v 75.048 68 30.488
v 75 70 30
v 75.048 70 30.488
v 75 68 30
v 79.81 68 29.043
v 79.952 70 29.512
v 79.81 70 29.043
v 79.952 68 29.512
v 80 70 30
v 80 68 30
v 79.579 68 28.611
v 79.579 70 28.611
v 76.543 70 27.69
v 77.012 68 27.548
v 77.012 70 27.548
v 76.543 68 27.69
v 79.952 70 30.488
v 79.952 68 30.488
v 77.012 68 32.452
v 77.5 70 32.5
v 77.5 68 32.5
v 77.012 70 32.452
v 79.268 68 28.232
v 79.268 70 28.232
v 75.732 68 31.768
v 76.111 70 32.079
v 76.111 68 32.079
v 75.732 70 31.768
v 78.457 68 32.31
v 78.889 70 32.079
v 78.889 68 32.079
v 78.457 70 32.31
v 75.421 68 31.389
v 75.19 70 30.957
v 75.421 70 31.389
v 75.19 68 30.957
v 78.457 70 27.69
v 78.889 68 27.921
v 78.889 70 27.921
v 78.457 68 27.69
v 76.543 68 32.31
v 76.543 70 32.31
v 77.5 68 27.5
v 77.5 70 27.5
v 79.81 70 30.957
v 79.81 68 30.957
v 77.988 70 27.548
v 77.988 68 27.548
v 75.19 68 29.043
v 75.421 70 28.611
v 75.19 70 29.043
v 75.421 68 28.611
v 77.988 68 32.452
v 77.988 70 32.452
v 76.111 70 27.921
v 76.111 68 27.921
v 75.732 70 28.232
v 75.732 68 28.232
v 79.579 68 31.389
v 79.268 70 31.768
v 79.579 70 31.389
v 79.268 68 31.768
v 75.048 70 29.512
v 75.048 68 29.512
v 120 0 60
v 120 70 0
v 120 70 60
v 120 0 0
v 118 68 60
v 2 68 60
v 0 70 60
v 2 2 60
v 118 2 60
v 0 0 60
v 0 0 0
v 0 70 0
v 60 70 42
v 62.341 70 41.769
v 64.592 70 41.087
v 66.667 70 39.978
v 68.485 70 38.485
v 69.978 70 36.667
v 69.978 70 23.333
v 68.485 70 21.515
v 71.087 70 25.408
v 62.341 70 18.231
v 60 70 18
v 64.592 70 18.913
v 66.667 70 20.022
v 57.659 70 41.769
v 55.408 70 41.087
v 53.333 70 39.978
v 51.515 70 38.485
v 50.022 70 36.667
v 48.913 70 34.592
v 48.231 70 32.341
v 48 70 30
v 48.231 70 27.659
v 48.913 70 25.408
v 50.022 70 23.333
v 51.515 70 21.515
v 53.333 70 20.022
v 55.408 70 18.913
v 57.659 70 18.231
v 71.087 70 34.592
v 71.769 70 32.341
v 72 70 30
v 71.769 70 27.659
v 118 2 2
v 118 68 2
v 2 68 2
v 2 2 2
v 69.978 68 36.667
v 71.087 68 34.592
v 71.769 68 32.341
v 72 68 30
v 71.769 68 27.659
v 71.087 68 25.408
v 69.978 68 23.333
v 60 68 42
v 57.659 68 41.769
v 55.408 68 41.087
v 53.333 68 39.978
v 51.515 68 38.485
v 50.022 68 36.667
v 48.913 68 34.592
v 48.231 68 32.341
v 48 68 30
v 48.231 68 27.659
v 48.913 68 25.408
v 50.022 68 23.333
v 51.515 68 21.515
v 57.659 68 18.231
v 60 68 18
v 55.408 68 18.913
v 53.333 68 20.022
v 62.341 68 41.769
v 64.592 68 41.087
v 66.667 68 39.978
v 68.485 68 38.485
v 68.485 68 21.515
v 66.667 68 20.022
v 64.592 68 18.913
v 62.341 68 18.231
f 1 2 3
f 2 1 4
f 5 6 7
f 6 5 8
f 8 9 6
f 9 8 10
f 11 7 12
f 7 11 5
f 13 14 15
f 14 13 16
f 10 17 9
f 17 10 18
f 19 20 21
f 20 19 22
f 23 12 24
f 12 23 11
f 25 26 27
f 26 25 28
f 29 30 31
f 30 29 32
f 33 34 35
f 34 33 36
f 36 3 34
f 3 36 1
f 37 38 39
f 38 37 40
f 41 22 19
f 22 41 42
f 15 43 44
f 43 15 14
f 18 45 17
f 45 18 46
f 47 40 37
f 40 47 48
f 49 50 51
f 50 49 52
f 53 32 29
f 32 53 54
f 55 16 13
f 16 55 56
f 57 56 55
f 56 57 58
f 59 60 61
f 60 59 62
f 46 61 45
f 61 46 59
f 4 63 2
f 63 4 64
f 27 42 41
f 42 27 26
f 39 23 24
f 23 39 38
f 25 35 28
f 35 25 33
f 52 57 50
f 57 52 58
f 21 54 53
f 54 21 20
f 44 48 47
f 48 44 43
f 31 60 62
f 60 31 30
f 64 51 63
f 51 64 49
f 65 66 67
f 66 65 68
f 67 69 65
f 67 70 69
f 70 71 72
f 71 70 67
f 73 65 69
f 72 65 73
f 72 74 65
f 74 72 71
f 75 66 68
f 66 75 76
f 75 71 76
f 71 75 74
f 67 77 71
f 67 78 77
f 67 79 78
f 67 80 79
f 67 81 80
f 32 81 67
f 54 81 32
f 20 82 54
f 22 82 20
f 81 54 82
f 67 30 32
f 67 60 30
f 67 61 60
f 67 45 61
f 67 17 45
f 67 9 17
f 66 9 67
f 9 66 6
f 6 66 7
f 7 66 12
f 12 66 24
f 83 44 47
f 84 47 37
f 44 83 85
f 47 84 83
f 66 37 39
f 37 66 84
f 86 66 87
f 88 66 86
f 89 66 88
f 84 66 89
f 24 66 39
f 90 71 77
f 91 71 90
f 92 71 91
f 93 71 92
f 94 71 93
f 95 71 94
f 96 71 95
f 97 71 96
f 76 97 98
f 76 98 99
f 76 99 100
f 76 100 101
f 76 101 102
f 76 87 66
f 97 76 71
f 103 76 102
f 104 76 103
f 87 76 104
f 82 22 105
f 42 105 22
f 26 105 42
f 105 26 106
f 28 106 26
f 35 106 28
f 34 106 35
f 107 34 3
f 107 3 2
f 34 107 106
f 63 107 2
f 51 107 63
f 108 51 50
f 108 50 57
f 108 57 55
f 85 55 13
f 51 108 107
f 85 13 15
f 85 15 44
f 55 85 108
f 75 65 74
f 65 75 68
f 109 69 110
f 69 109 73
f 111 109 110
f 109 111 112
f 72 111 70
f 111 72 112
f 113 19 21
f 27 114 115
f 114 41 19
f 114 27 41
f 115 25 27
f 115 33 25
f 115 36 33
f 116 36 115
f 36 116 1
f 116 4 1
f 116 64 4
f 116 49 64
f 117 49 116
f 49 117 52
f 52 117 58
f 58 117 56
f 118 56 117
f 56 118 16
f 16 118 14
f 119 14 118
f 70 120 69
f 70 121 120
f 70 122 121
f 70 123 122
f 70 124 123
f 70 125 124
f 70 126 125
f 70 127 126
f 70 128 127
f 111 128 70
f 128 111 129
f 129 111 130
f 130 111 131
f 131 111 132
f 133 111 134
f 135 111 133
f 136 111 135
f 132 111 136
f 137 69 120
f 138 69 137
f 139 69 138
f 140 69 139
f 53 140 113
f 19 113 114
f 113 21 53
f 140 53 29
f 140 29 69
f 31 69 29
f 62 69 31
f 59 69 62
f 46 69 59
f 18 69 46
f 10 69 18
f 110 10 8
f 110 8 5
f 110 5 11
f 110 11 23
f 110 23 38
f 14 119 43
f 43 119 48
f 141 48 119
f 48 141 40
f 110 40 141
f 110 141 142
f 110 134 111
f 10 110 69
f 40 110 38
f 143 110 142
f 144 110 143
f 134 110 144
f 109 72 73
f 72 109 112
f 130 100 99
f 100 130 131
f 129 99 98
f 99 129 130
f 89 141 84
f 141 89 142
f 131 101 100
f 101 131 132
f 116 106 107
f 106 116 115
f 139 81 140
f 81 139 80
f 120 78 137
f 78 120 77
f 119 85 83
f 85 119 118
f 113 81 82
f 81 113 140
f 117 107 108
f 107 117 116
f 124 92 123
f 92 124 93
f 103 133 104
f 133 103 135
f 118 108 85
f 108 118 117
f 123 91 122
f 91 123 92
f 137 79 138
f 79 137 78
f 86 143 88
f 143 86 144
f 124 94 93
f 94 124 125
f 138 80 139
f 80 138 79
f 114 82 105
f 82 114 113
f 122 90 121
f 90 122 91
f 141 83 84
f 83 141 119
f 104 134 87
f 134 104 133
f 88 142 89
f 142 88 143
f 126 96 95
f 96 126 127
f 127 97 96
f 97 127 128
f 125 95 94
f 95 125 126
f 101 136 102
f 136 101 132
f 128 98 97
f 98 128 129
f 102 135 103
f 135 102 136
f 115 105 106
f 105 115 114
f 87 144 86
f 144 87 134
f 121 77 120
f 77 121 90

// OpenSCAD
$fn = 32;

// ----------------------------------------------------------------------
// Vent box: roundvent enclosure
// ----------------------------------------------------------------------

// --- parameters (mm) ---
box_l = 120;              // box length, X
box_w = 70;               // box width, Y
box_h = 60;               // box height, Z
wall_t = 2;               // shell wall thickness
vent_d = 24;              // central vent diameter
ring_d = 5;               // ring hole diameter
n_ring = 6;               // holes in the ring
ring_r = 17.5;            // ring radius

ring_step = 360 / n_ring;  // ring hole angular step

difference() {
  cube([box_l, box_w, box_h]);
  translate([wall_t, wall_t, wall_t])
    cube([box_l - 2 * wall_t, box_w - 2 * wall_t, box_h]);
  translate([box_l / 2, box_w - wall_t - 1, box_h / 2])
    rotate([-90, 0, 0]) cylinder(h = wall_t + 2, d = vent_d);
  for (i = [0 : n_ring - 1])
    translate([box_l / 2, box_w - wall_t - 1, box_h / 2])
      rotate([0, 0, i * ring_step])
        translate([ring_r, 0, 0]) rotate([-90, 0, 0])
          cylinder(h = wall_t + 2, d = ring_d);
}
